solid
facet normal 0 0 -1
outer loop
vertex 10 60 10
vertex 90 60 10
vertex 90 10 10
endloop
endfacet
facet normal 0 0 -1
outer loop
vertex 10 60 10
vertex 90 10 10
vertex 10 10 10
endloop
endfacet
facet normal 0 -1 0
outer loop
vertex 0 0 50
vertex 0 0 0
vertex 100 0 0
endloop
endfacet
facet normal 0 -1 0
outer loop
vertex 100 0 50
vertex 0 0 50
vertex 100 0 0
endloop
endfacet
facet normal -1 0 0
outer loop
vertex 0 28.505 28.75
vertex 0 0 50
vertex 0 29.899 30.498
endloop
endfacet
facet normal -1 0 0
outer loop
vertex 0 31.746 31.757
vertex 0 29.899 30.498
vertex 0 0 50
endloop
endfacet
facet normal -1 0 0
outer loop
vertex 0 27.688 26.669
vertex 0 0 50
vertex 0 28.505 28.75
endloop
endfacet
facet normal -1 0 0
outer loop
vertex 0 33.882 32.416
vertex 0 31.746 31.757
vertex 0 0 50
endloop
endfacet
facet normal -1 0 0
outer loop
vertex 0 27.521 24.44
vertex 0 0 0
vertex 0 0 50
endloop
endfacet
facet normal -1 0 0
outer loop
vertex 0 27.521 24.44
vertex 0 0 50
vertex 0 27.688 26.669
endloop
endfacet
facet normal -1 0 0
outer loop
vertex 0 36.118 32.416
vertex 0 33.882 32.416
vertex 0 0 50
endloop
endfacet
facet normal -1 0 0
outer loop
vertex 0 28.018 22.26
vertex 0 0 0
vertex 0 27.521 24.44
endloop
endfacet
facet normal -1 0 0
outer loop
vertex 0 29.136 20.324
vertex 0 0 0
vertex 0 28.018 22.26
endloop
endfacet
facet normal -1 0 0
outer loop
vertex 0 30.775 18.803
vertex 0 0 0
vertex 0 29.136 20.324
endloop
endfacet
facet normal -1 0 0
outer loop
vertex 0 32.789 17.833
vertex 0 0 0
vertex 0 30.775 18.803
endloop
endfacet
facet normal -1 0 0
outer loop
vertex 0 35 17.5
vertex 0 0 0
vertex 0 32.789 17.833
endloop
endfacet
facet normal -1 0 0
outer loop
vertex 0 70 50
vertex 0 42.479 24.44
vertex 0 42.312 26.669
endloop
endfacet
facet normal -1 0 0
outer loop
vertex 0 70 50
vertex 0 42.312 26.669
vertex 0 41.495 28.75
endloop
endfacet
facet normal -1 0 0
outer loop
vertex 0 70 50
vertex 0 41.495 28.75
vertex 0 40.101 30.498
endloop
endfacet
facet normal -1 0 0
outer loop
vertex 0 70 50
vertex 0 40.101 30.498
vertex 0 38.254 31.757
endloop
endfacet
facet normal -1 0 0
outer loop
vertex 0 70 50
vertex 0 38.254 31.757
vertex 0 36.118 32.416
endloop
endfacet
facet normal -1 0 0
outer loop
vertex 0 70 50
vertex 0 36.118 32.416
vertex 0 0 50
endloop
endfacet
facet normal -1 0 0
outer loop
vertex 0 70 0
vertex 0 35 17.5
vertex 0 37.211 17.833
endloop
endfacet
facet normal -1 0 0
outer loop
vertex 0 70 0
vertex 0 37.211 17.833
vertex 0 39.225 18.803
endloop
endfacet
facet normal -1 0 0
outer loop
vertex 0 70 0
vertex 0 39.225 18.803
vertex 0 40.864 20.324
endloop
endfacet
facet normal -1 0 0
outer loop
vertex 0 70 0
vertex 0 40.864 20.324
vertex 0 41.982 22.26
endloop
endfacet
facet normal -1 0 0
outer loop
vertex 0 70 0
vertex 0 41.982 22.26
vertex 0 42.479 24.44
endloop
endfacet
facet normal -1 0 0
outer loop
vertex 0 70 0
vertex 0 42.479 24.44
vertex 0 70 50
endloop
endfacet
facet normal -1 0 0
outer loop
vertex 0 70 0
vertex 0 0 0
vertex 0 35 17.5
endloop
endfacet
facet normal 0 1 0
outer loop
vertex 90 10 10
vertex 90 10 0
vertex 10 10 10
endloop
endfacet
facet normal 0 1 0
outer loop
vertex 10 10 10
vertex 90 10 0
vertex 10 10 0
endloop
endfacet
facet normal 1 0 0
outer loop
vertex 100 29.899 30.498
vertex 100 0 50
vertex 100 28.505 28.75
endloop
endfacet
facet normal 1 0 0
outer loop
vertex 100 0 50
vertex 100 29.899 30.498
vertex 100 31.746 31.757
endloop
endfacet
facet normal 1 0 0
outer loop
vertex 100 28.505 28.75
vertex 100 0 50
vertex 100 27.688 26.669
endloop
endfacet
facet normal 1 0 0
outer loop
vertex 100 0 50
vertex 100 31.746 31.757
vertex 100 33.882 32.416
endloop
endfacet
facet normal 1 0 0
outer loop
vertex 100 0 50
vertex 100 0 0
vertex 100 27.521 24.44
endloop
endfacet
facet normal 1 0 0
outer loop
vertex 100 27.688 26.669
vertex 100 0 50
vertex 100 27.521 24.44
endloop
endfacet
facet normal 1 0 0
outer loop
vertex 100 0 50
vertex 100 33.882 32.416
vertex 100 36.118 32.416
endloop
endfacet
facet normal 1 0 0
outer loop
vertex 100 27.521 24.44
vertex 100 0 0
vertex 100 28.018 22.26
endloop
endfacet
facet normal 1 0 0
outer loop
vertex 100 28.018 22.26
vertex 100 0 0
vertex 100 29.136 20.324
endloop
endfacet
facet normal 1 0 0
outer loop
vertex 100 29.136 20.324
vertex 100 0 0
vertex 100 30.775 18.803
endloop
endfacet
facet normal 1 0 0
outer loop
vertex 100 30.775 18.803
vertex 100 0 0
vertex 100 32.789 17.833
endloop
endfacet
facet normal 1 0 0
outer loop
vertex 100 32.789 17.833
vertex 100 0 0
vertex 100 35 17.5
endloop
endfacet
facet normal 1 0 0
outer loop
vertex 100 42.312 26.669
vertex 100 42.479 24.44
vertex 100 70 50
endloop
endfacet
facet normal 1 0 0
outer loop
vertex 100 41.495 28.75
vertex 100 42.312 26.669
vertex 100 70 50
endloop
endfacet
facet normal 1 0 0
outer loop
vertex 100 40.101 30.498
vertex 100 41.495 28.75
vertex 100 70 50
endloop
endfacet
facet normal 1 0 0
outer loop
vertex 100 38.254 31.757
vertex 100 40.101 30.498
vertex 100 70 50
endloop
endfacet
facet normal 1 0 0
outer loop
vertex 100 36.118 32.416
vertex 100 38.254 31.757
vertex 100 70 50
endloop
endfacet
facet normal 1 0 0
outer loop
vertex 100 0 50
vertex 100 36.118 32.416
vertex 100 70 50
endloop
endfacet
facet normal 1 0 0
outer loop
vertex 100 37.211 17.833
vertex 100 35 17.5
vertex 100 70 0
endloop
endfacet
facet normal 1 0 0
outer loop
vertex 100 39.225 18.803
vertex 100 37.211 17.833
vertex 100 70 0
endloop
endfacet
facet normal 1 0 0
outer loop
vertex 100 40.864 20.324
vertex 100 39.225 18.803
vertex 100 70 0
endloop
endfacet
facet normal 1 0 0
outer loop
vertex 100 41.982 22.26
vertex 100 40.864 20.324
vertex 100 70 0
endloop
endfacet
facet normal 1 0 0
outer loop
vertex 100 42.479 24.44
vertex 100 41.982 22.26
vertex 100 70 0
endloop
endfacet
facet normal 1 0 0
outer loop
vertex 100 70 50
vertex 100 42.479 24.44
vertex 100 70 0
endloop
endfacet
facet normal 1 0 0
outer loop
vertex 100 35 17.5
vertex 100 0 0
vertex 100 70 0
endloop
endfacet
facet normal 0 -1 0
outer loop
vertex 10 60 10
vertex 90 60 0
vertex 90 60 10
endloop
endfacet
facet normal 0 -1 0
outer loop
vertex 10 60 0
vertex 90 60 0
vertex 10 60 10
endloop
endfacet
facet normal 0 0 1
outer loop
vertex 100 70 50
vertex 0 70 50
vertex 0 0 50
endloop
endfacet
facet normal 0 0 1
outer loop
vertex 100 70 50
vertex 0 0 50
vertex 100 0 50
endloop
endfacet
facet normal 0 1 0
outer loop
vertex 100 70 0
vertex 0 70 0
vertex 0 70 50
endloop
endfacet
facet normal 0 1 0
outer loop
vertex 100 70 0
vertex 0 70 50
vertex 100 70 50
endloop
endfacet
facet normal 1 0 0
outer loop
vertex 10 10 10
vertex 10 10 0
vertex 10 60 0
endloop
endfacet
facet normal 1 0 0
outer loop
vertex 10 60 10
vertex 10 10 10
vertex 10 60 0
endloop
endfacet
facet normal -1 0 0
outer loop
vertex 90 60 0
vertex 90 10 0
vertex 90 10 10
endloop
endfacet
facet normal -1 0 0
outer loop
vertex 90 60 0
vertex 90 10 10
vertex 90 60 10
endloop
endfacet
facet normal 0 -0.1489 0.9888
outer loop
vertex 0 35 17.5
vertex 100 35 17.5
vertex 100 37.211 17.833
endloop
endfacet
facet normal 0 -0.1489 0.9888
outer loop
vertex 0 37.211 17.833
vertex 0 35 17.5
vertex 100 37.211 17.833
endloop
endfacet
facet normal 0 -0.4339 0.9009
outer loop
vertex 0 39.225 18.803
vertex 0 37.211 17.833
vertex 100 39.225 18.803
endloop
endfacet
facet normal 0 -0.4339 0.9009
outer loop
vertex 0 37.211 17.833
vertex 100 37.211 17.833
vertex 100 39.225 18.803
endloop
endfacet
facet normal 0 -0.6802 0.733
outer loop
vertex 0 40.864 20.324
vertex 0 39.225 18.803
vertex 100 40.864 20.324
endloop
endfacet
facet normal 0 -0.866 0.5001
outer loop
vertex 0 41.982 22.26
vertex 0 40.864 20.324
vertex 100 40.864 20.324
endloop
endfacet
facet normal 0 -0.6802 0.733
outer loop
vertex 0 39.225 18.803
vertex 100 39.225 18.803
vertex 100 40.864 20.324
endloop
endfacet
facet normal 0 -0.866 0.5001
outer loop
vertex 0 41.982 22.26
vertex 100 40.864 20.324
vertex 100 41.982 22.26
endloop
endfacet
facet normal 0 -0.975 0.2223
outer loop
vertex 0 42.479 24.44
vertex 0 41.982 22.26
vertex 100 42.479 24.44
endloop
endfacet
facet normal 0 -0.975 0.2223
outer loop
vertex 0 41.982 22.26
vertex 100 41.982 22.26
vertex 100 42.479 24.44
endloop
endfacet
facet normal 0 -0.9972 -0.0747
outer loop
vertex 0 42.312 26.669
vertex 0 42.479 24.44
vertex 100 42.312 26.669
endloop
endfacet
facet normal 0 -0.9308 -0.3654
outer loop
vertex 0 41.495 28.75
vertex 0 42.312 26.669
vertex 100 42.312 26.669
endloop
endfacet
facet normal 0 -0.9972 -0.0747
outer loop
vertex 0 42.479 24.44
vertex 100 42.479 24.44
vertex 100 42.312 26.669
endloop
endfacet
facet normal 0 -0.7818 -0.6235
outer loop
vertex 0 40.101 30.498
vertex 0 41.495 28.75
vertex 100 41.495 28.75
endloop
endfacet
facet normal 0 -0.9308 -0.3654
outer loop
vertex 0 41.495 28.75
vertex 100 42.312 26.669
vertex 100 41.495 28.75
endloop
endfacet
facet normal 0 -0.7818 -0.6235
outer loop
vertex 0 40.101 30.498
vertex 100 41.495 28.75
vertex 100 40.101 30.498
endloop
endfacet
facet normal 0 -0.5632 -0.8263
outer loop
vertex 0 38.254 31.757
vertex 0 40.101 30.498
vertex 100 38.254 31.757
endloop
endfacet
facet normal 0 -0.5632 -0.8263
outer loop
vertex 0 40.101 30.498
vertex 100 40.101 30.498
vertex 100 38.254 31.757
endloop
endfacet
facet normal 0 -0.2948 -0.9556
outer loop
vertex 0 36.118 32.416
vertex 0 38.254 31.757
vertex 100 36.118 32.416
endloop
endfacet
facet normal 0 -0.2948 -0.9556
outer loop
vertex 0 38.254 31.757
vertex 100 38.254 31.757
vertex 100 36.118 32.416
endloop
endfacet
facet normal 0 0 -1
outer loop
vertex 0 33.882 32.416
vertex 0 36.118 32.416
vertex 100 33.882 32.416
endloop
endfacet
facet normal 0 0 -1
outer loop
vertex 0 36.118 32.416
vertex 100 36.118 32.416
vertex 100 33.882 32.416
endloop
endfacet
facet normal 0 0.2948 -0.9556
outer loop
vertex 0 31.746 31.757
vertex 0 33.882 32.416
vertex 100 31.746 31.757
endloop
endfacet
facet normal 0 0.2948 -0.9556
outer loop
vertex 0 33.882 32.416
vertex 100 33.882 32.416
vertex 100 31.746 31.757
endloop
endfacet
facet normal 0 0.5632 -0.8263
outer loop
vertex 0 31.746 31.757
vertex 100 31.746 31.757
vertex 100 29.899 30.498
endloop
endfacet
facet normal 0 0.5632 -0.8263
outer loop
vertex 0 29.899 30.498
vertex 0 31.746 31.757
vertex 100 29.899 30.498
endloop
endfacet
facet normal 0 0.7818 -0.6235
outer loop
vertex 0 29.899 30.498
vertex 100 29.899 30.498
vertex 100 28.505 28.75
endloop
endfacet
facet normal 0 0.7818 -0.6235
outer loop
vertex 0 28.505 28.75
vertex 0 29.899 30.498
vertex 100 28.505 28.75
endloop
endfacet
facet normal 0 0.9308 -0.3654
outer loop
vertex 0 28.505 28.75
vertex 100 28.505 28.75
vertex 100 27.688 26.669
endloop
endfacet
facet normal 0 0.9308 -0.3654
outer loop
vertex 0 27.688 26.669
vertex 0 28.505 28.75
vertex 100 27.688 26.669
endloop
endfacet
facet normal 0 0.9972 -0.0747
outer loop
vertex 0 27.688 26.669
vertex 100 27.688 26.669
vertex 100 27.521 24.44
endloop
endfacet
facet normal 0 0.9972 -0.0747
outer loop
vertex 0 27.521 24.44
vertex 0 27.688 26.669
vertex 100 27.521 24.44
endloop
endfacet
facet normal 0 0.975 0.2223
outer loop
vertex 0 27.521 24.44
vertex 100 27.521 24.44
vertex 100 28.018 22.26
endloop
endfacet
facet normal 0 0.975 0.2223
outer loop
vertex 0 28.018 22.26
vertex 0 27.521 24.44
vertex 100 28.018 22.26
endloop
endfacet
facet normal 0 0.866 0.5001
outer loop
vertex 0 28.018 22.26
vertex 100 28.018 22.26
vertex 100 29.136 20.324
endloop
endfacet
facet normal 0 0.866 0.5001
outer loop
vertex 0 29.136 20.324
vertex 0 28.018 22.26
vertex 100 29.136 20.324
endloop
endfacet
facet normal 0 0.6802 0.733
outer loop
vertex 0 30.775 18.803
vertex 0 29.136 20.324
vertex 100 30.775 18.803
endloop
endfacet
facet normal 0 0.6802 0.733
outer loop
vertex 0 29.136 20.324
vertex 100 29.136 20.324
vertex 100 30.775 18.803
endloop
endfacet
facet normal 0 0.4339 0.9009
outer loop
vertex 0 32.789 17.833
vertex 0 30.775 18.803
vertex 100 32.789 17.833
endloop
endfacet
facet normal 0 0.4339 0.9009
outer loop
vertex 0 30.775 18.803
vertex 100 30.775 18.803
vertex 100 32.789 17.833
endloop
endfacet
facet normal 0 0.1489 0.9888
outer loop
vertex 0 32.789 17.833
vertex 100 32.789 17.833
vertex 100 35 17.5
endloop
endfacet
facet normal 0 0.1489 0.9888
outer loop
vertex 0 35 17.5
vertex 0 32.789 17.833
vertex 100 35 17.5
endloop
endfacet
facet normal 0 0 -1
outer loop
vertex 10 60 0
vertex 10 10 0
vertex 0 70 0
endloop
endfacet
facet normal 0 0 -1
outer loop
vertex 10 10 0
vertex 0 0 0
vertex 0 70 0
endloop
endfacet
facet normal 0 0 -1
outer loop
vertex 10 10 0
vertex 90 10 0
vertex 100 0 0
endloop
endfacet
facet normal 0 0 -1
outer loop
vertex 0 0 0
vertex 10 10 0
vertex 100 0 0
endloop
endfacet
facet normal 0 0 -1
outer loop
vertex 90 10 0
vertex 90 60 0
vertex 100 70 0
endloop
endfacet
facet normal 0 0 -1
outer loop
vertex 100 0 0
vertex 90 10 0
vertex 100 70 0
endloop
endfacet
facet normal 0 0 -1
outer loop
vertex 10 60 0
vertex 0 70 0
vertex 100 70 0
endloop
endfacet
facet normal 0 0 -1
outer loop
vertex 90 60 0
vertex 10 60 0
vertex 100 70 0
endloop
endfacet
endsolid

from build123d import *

# Parameters (mm, degrees)
SKETCH1_W           = 100
SKETCH1_H           = 70
BOSS_EXTRUDE1_DEPTH = 50
SKETCH2_R           = 7.5
CUT_EXTRUDE1_DEPTH  = 100
SKETCH3_W           = 80
SKETCH3_H           = 50
CUT_EXTRUDE2_DEPTH  = 10


with BuildPart() as part:
    # Sketch1 → Boss-Extrude1 (new body)
    with BuildSketch(Plane.XY):
        with Locations((50, 35)):
            Rectangle(SKETCH1_W, SKETCH1_H)
    extrude(amount=BOSS_EXTRUDE1_DEPTH)

    # Sketch2 → Cut-Extrude1 (cut)
    with BuildSketch(Plane(origin=(100, 0, 0), x_dir=(0, 0, -1), z_dir=(1, 0, 0))):
        with Locations((-25, 35)):
            Circle(SKETCH2_R)
    extrude(amount=-CUT_EXTRUDE1_DEPTH, mode=Mode.SUBTRACT)

    # Sketch3 → Cut-Extrude2 (cut)
    with BuildSketch(Plane(origin=(0, 0, 0), x_dir=(-1, 0, 0), z_dir=(0, 0, -1))):
        with Locations((-50, 35)):
            Rectangle(SKETCH3_W, SKETCH3_H)
    extrude(amount=-CUT_EXTRUDE2_DEPTH, mode=Mode.SUBTRACT)


solid = part.part
